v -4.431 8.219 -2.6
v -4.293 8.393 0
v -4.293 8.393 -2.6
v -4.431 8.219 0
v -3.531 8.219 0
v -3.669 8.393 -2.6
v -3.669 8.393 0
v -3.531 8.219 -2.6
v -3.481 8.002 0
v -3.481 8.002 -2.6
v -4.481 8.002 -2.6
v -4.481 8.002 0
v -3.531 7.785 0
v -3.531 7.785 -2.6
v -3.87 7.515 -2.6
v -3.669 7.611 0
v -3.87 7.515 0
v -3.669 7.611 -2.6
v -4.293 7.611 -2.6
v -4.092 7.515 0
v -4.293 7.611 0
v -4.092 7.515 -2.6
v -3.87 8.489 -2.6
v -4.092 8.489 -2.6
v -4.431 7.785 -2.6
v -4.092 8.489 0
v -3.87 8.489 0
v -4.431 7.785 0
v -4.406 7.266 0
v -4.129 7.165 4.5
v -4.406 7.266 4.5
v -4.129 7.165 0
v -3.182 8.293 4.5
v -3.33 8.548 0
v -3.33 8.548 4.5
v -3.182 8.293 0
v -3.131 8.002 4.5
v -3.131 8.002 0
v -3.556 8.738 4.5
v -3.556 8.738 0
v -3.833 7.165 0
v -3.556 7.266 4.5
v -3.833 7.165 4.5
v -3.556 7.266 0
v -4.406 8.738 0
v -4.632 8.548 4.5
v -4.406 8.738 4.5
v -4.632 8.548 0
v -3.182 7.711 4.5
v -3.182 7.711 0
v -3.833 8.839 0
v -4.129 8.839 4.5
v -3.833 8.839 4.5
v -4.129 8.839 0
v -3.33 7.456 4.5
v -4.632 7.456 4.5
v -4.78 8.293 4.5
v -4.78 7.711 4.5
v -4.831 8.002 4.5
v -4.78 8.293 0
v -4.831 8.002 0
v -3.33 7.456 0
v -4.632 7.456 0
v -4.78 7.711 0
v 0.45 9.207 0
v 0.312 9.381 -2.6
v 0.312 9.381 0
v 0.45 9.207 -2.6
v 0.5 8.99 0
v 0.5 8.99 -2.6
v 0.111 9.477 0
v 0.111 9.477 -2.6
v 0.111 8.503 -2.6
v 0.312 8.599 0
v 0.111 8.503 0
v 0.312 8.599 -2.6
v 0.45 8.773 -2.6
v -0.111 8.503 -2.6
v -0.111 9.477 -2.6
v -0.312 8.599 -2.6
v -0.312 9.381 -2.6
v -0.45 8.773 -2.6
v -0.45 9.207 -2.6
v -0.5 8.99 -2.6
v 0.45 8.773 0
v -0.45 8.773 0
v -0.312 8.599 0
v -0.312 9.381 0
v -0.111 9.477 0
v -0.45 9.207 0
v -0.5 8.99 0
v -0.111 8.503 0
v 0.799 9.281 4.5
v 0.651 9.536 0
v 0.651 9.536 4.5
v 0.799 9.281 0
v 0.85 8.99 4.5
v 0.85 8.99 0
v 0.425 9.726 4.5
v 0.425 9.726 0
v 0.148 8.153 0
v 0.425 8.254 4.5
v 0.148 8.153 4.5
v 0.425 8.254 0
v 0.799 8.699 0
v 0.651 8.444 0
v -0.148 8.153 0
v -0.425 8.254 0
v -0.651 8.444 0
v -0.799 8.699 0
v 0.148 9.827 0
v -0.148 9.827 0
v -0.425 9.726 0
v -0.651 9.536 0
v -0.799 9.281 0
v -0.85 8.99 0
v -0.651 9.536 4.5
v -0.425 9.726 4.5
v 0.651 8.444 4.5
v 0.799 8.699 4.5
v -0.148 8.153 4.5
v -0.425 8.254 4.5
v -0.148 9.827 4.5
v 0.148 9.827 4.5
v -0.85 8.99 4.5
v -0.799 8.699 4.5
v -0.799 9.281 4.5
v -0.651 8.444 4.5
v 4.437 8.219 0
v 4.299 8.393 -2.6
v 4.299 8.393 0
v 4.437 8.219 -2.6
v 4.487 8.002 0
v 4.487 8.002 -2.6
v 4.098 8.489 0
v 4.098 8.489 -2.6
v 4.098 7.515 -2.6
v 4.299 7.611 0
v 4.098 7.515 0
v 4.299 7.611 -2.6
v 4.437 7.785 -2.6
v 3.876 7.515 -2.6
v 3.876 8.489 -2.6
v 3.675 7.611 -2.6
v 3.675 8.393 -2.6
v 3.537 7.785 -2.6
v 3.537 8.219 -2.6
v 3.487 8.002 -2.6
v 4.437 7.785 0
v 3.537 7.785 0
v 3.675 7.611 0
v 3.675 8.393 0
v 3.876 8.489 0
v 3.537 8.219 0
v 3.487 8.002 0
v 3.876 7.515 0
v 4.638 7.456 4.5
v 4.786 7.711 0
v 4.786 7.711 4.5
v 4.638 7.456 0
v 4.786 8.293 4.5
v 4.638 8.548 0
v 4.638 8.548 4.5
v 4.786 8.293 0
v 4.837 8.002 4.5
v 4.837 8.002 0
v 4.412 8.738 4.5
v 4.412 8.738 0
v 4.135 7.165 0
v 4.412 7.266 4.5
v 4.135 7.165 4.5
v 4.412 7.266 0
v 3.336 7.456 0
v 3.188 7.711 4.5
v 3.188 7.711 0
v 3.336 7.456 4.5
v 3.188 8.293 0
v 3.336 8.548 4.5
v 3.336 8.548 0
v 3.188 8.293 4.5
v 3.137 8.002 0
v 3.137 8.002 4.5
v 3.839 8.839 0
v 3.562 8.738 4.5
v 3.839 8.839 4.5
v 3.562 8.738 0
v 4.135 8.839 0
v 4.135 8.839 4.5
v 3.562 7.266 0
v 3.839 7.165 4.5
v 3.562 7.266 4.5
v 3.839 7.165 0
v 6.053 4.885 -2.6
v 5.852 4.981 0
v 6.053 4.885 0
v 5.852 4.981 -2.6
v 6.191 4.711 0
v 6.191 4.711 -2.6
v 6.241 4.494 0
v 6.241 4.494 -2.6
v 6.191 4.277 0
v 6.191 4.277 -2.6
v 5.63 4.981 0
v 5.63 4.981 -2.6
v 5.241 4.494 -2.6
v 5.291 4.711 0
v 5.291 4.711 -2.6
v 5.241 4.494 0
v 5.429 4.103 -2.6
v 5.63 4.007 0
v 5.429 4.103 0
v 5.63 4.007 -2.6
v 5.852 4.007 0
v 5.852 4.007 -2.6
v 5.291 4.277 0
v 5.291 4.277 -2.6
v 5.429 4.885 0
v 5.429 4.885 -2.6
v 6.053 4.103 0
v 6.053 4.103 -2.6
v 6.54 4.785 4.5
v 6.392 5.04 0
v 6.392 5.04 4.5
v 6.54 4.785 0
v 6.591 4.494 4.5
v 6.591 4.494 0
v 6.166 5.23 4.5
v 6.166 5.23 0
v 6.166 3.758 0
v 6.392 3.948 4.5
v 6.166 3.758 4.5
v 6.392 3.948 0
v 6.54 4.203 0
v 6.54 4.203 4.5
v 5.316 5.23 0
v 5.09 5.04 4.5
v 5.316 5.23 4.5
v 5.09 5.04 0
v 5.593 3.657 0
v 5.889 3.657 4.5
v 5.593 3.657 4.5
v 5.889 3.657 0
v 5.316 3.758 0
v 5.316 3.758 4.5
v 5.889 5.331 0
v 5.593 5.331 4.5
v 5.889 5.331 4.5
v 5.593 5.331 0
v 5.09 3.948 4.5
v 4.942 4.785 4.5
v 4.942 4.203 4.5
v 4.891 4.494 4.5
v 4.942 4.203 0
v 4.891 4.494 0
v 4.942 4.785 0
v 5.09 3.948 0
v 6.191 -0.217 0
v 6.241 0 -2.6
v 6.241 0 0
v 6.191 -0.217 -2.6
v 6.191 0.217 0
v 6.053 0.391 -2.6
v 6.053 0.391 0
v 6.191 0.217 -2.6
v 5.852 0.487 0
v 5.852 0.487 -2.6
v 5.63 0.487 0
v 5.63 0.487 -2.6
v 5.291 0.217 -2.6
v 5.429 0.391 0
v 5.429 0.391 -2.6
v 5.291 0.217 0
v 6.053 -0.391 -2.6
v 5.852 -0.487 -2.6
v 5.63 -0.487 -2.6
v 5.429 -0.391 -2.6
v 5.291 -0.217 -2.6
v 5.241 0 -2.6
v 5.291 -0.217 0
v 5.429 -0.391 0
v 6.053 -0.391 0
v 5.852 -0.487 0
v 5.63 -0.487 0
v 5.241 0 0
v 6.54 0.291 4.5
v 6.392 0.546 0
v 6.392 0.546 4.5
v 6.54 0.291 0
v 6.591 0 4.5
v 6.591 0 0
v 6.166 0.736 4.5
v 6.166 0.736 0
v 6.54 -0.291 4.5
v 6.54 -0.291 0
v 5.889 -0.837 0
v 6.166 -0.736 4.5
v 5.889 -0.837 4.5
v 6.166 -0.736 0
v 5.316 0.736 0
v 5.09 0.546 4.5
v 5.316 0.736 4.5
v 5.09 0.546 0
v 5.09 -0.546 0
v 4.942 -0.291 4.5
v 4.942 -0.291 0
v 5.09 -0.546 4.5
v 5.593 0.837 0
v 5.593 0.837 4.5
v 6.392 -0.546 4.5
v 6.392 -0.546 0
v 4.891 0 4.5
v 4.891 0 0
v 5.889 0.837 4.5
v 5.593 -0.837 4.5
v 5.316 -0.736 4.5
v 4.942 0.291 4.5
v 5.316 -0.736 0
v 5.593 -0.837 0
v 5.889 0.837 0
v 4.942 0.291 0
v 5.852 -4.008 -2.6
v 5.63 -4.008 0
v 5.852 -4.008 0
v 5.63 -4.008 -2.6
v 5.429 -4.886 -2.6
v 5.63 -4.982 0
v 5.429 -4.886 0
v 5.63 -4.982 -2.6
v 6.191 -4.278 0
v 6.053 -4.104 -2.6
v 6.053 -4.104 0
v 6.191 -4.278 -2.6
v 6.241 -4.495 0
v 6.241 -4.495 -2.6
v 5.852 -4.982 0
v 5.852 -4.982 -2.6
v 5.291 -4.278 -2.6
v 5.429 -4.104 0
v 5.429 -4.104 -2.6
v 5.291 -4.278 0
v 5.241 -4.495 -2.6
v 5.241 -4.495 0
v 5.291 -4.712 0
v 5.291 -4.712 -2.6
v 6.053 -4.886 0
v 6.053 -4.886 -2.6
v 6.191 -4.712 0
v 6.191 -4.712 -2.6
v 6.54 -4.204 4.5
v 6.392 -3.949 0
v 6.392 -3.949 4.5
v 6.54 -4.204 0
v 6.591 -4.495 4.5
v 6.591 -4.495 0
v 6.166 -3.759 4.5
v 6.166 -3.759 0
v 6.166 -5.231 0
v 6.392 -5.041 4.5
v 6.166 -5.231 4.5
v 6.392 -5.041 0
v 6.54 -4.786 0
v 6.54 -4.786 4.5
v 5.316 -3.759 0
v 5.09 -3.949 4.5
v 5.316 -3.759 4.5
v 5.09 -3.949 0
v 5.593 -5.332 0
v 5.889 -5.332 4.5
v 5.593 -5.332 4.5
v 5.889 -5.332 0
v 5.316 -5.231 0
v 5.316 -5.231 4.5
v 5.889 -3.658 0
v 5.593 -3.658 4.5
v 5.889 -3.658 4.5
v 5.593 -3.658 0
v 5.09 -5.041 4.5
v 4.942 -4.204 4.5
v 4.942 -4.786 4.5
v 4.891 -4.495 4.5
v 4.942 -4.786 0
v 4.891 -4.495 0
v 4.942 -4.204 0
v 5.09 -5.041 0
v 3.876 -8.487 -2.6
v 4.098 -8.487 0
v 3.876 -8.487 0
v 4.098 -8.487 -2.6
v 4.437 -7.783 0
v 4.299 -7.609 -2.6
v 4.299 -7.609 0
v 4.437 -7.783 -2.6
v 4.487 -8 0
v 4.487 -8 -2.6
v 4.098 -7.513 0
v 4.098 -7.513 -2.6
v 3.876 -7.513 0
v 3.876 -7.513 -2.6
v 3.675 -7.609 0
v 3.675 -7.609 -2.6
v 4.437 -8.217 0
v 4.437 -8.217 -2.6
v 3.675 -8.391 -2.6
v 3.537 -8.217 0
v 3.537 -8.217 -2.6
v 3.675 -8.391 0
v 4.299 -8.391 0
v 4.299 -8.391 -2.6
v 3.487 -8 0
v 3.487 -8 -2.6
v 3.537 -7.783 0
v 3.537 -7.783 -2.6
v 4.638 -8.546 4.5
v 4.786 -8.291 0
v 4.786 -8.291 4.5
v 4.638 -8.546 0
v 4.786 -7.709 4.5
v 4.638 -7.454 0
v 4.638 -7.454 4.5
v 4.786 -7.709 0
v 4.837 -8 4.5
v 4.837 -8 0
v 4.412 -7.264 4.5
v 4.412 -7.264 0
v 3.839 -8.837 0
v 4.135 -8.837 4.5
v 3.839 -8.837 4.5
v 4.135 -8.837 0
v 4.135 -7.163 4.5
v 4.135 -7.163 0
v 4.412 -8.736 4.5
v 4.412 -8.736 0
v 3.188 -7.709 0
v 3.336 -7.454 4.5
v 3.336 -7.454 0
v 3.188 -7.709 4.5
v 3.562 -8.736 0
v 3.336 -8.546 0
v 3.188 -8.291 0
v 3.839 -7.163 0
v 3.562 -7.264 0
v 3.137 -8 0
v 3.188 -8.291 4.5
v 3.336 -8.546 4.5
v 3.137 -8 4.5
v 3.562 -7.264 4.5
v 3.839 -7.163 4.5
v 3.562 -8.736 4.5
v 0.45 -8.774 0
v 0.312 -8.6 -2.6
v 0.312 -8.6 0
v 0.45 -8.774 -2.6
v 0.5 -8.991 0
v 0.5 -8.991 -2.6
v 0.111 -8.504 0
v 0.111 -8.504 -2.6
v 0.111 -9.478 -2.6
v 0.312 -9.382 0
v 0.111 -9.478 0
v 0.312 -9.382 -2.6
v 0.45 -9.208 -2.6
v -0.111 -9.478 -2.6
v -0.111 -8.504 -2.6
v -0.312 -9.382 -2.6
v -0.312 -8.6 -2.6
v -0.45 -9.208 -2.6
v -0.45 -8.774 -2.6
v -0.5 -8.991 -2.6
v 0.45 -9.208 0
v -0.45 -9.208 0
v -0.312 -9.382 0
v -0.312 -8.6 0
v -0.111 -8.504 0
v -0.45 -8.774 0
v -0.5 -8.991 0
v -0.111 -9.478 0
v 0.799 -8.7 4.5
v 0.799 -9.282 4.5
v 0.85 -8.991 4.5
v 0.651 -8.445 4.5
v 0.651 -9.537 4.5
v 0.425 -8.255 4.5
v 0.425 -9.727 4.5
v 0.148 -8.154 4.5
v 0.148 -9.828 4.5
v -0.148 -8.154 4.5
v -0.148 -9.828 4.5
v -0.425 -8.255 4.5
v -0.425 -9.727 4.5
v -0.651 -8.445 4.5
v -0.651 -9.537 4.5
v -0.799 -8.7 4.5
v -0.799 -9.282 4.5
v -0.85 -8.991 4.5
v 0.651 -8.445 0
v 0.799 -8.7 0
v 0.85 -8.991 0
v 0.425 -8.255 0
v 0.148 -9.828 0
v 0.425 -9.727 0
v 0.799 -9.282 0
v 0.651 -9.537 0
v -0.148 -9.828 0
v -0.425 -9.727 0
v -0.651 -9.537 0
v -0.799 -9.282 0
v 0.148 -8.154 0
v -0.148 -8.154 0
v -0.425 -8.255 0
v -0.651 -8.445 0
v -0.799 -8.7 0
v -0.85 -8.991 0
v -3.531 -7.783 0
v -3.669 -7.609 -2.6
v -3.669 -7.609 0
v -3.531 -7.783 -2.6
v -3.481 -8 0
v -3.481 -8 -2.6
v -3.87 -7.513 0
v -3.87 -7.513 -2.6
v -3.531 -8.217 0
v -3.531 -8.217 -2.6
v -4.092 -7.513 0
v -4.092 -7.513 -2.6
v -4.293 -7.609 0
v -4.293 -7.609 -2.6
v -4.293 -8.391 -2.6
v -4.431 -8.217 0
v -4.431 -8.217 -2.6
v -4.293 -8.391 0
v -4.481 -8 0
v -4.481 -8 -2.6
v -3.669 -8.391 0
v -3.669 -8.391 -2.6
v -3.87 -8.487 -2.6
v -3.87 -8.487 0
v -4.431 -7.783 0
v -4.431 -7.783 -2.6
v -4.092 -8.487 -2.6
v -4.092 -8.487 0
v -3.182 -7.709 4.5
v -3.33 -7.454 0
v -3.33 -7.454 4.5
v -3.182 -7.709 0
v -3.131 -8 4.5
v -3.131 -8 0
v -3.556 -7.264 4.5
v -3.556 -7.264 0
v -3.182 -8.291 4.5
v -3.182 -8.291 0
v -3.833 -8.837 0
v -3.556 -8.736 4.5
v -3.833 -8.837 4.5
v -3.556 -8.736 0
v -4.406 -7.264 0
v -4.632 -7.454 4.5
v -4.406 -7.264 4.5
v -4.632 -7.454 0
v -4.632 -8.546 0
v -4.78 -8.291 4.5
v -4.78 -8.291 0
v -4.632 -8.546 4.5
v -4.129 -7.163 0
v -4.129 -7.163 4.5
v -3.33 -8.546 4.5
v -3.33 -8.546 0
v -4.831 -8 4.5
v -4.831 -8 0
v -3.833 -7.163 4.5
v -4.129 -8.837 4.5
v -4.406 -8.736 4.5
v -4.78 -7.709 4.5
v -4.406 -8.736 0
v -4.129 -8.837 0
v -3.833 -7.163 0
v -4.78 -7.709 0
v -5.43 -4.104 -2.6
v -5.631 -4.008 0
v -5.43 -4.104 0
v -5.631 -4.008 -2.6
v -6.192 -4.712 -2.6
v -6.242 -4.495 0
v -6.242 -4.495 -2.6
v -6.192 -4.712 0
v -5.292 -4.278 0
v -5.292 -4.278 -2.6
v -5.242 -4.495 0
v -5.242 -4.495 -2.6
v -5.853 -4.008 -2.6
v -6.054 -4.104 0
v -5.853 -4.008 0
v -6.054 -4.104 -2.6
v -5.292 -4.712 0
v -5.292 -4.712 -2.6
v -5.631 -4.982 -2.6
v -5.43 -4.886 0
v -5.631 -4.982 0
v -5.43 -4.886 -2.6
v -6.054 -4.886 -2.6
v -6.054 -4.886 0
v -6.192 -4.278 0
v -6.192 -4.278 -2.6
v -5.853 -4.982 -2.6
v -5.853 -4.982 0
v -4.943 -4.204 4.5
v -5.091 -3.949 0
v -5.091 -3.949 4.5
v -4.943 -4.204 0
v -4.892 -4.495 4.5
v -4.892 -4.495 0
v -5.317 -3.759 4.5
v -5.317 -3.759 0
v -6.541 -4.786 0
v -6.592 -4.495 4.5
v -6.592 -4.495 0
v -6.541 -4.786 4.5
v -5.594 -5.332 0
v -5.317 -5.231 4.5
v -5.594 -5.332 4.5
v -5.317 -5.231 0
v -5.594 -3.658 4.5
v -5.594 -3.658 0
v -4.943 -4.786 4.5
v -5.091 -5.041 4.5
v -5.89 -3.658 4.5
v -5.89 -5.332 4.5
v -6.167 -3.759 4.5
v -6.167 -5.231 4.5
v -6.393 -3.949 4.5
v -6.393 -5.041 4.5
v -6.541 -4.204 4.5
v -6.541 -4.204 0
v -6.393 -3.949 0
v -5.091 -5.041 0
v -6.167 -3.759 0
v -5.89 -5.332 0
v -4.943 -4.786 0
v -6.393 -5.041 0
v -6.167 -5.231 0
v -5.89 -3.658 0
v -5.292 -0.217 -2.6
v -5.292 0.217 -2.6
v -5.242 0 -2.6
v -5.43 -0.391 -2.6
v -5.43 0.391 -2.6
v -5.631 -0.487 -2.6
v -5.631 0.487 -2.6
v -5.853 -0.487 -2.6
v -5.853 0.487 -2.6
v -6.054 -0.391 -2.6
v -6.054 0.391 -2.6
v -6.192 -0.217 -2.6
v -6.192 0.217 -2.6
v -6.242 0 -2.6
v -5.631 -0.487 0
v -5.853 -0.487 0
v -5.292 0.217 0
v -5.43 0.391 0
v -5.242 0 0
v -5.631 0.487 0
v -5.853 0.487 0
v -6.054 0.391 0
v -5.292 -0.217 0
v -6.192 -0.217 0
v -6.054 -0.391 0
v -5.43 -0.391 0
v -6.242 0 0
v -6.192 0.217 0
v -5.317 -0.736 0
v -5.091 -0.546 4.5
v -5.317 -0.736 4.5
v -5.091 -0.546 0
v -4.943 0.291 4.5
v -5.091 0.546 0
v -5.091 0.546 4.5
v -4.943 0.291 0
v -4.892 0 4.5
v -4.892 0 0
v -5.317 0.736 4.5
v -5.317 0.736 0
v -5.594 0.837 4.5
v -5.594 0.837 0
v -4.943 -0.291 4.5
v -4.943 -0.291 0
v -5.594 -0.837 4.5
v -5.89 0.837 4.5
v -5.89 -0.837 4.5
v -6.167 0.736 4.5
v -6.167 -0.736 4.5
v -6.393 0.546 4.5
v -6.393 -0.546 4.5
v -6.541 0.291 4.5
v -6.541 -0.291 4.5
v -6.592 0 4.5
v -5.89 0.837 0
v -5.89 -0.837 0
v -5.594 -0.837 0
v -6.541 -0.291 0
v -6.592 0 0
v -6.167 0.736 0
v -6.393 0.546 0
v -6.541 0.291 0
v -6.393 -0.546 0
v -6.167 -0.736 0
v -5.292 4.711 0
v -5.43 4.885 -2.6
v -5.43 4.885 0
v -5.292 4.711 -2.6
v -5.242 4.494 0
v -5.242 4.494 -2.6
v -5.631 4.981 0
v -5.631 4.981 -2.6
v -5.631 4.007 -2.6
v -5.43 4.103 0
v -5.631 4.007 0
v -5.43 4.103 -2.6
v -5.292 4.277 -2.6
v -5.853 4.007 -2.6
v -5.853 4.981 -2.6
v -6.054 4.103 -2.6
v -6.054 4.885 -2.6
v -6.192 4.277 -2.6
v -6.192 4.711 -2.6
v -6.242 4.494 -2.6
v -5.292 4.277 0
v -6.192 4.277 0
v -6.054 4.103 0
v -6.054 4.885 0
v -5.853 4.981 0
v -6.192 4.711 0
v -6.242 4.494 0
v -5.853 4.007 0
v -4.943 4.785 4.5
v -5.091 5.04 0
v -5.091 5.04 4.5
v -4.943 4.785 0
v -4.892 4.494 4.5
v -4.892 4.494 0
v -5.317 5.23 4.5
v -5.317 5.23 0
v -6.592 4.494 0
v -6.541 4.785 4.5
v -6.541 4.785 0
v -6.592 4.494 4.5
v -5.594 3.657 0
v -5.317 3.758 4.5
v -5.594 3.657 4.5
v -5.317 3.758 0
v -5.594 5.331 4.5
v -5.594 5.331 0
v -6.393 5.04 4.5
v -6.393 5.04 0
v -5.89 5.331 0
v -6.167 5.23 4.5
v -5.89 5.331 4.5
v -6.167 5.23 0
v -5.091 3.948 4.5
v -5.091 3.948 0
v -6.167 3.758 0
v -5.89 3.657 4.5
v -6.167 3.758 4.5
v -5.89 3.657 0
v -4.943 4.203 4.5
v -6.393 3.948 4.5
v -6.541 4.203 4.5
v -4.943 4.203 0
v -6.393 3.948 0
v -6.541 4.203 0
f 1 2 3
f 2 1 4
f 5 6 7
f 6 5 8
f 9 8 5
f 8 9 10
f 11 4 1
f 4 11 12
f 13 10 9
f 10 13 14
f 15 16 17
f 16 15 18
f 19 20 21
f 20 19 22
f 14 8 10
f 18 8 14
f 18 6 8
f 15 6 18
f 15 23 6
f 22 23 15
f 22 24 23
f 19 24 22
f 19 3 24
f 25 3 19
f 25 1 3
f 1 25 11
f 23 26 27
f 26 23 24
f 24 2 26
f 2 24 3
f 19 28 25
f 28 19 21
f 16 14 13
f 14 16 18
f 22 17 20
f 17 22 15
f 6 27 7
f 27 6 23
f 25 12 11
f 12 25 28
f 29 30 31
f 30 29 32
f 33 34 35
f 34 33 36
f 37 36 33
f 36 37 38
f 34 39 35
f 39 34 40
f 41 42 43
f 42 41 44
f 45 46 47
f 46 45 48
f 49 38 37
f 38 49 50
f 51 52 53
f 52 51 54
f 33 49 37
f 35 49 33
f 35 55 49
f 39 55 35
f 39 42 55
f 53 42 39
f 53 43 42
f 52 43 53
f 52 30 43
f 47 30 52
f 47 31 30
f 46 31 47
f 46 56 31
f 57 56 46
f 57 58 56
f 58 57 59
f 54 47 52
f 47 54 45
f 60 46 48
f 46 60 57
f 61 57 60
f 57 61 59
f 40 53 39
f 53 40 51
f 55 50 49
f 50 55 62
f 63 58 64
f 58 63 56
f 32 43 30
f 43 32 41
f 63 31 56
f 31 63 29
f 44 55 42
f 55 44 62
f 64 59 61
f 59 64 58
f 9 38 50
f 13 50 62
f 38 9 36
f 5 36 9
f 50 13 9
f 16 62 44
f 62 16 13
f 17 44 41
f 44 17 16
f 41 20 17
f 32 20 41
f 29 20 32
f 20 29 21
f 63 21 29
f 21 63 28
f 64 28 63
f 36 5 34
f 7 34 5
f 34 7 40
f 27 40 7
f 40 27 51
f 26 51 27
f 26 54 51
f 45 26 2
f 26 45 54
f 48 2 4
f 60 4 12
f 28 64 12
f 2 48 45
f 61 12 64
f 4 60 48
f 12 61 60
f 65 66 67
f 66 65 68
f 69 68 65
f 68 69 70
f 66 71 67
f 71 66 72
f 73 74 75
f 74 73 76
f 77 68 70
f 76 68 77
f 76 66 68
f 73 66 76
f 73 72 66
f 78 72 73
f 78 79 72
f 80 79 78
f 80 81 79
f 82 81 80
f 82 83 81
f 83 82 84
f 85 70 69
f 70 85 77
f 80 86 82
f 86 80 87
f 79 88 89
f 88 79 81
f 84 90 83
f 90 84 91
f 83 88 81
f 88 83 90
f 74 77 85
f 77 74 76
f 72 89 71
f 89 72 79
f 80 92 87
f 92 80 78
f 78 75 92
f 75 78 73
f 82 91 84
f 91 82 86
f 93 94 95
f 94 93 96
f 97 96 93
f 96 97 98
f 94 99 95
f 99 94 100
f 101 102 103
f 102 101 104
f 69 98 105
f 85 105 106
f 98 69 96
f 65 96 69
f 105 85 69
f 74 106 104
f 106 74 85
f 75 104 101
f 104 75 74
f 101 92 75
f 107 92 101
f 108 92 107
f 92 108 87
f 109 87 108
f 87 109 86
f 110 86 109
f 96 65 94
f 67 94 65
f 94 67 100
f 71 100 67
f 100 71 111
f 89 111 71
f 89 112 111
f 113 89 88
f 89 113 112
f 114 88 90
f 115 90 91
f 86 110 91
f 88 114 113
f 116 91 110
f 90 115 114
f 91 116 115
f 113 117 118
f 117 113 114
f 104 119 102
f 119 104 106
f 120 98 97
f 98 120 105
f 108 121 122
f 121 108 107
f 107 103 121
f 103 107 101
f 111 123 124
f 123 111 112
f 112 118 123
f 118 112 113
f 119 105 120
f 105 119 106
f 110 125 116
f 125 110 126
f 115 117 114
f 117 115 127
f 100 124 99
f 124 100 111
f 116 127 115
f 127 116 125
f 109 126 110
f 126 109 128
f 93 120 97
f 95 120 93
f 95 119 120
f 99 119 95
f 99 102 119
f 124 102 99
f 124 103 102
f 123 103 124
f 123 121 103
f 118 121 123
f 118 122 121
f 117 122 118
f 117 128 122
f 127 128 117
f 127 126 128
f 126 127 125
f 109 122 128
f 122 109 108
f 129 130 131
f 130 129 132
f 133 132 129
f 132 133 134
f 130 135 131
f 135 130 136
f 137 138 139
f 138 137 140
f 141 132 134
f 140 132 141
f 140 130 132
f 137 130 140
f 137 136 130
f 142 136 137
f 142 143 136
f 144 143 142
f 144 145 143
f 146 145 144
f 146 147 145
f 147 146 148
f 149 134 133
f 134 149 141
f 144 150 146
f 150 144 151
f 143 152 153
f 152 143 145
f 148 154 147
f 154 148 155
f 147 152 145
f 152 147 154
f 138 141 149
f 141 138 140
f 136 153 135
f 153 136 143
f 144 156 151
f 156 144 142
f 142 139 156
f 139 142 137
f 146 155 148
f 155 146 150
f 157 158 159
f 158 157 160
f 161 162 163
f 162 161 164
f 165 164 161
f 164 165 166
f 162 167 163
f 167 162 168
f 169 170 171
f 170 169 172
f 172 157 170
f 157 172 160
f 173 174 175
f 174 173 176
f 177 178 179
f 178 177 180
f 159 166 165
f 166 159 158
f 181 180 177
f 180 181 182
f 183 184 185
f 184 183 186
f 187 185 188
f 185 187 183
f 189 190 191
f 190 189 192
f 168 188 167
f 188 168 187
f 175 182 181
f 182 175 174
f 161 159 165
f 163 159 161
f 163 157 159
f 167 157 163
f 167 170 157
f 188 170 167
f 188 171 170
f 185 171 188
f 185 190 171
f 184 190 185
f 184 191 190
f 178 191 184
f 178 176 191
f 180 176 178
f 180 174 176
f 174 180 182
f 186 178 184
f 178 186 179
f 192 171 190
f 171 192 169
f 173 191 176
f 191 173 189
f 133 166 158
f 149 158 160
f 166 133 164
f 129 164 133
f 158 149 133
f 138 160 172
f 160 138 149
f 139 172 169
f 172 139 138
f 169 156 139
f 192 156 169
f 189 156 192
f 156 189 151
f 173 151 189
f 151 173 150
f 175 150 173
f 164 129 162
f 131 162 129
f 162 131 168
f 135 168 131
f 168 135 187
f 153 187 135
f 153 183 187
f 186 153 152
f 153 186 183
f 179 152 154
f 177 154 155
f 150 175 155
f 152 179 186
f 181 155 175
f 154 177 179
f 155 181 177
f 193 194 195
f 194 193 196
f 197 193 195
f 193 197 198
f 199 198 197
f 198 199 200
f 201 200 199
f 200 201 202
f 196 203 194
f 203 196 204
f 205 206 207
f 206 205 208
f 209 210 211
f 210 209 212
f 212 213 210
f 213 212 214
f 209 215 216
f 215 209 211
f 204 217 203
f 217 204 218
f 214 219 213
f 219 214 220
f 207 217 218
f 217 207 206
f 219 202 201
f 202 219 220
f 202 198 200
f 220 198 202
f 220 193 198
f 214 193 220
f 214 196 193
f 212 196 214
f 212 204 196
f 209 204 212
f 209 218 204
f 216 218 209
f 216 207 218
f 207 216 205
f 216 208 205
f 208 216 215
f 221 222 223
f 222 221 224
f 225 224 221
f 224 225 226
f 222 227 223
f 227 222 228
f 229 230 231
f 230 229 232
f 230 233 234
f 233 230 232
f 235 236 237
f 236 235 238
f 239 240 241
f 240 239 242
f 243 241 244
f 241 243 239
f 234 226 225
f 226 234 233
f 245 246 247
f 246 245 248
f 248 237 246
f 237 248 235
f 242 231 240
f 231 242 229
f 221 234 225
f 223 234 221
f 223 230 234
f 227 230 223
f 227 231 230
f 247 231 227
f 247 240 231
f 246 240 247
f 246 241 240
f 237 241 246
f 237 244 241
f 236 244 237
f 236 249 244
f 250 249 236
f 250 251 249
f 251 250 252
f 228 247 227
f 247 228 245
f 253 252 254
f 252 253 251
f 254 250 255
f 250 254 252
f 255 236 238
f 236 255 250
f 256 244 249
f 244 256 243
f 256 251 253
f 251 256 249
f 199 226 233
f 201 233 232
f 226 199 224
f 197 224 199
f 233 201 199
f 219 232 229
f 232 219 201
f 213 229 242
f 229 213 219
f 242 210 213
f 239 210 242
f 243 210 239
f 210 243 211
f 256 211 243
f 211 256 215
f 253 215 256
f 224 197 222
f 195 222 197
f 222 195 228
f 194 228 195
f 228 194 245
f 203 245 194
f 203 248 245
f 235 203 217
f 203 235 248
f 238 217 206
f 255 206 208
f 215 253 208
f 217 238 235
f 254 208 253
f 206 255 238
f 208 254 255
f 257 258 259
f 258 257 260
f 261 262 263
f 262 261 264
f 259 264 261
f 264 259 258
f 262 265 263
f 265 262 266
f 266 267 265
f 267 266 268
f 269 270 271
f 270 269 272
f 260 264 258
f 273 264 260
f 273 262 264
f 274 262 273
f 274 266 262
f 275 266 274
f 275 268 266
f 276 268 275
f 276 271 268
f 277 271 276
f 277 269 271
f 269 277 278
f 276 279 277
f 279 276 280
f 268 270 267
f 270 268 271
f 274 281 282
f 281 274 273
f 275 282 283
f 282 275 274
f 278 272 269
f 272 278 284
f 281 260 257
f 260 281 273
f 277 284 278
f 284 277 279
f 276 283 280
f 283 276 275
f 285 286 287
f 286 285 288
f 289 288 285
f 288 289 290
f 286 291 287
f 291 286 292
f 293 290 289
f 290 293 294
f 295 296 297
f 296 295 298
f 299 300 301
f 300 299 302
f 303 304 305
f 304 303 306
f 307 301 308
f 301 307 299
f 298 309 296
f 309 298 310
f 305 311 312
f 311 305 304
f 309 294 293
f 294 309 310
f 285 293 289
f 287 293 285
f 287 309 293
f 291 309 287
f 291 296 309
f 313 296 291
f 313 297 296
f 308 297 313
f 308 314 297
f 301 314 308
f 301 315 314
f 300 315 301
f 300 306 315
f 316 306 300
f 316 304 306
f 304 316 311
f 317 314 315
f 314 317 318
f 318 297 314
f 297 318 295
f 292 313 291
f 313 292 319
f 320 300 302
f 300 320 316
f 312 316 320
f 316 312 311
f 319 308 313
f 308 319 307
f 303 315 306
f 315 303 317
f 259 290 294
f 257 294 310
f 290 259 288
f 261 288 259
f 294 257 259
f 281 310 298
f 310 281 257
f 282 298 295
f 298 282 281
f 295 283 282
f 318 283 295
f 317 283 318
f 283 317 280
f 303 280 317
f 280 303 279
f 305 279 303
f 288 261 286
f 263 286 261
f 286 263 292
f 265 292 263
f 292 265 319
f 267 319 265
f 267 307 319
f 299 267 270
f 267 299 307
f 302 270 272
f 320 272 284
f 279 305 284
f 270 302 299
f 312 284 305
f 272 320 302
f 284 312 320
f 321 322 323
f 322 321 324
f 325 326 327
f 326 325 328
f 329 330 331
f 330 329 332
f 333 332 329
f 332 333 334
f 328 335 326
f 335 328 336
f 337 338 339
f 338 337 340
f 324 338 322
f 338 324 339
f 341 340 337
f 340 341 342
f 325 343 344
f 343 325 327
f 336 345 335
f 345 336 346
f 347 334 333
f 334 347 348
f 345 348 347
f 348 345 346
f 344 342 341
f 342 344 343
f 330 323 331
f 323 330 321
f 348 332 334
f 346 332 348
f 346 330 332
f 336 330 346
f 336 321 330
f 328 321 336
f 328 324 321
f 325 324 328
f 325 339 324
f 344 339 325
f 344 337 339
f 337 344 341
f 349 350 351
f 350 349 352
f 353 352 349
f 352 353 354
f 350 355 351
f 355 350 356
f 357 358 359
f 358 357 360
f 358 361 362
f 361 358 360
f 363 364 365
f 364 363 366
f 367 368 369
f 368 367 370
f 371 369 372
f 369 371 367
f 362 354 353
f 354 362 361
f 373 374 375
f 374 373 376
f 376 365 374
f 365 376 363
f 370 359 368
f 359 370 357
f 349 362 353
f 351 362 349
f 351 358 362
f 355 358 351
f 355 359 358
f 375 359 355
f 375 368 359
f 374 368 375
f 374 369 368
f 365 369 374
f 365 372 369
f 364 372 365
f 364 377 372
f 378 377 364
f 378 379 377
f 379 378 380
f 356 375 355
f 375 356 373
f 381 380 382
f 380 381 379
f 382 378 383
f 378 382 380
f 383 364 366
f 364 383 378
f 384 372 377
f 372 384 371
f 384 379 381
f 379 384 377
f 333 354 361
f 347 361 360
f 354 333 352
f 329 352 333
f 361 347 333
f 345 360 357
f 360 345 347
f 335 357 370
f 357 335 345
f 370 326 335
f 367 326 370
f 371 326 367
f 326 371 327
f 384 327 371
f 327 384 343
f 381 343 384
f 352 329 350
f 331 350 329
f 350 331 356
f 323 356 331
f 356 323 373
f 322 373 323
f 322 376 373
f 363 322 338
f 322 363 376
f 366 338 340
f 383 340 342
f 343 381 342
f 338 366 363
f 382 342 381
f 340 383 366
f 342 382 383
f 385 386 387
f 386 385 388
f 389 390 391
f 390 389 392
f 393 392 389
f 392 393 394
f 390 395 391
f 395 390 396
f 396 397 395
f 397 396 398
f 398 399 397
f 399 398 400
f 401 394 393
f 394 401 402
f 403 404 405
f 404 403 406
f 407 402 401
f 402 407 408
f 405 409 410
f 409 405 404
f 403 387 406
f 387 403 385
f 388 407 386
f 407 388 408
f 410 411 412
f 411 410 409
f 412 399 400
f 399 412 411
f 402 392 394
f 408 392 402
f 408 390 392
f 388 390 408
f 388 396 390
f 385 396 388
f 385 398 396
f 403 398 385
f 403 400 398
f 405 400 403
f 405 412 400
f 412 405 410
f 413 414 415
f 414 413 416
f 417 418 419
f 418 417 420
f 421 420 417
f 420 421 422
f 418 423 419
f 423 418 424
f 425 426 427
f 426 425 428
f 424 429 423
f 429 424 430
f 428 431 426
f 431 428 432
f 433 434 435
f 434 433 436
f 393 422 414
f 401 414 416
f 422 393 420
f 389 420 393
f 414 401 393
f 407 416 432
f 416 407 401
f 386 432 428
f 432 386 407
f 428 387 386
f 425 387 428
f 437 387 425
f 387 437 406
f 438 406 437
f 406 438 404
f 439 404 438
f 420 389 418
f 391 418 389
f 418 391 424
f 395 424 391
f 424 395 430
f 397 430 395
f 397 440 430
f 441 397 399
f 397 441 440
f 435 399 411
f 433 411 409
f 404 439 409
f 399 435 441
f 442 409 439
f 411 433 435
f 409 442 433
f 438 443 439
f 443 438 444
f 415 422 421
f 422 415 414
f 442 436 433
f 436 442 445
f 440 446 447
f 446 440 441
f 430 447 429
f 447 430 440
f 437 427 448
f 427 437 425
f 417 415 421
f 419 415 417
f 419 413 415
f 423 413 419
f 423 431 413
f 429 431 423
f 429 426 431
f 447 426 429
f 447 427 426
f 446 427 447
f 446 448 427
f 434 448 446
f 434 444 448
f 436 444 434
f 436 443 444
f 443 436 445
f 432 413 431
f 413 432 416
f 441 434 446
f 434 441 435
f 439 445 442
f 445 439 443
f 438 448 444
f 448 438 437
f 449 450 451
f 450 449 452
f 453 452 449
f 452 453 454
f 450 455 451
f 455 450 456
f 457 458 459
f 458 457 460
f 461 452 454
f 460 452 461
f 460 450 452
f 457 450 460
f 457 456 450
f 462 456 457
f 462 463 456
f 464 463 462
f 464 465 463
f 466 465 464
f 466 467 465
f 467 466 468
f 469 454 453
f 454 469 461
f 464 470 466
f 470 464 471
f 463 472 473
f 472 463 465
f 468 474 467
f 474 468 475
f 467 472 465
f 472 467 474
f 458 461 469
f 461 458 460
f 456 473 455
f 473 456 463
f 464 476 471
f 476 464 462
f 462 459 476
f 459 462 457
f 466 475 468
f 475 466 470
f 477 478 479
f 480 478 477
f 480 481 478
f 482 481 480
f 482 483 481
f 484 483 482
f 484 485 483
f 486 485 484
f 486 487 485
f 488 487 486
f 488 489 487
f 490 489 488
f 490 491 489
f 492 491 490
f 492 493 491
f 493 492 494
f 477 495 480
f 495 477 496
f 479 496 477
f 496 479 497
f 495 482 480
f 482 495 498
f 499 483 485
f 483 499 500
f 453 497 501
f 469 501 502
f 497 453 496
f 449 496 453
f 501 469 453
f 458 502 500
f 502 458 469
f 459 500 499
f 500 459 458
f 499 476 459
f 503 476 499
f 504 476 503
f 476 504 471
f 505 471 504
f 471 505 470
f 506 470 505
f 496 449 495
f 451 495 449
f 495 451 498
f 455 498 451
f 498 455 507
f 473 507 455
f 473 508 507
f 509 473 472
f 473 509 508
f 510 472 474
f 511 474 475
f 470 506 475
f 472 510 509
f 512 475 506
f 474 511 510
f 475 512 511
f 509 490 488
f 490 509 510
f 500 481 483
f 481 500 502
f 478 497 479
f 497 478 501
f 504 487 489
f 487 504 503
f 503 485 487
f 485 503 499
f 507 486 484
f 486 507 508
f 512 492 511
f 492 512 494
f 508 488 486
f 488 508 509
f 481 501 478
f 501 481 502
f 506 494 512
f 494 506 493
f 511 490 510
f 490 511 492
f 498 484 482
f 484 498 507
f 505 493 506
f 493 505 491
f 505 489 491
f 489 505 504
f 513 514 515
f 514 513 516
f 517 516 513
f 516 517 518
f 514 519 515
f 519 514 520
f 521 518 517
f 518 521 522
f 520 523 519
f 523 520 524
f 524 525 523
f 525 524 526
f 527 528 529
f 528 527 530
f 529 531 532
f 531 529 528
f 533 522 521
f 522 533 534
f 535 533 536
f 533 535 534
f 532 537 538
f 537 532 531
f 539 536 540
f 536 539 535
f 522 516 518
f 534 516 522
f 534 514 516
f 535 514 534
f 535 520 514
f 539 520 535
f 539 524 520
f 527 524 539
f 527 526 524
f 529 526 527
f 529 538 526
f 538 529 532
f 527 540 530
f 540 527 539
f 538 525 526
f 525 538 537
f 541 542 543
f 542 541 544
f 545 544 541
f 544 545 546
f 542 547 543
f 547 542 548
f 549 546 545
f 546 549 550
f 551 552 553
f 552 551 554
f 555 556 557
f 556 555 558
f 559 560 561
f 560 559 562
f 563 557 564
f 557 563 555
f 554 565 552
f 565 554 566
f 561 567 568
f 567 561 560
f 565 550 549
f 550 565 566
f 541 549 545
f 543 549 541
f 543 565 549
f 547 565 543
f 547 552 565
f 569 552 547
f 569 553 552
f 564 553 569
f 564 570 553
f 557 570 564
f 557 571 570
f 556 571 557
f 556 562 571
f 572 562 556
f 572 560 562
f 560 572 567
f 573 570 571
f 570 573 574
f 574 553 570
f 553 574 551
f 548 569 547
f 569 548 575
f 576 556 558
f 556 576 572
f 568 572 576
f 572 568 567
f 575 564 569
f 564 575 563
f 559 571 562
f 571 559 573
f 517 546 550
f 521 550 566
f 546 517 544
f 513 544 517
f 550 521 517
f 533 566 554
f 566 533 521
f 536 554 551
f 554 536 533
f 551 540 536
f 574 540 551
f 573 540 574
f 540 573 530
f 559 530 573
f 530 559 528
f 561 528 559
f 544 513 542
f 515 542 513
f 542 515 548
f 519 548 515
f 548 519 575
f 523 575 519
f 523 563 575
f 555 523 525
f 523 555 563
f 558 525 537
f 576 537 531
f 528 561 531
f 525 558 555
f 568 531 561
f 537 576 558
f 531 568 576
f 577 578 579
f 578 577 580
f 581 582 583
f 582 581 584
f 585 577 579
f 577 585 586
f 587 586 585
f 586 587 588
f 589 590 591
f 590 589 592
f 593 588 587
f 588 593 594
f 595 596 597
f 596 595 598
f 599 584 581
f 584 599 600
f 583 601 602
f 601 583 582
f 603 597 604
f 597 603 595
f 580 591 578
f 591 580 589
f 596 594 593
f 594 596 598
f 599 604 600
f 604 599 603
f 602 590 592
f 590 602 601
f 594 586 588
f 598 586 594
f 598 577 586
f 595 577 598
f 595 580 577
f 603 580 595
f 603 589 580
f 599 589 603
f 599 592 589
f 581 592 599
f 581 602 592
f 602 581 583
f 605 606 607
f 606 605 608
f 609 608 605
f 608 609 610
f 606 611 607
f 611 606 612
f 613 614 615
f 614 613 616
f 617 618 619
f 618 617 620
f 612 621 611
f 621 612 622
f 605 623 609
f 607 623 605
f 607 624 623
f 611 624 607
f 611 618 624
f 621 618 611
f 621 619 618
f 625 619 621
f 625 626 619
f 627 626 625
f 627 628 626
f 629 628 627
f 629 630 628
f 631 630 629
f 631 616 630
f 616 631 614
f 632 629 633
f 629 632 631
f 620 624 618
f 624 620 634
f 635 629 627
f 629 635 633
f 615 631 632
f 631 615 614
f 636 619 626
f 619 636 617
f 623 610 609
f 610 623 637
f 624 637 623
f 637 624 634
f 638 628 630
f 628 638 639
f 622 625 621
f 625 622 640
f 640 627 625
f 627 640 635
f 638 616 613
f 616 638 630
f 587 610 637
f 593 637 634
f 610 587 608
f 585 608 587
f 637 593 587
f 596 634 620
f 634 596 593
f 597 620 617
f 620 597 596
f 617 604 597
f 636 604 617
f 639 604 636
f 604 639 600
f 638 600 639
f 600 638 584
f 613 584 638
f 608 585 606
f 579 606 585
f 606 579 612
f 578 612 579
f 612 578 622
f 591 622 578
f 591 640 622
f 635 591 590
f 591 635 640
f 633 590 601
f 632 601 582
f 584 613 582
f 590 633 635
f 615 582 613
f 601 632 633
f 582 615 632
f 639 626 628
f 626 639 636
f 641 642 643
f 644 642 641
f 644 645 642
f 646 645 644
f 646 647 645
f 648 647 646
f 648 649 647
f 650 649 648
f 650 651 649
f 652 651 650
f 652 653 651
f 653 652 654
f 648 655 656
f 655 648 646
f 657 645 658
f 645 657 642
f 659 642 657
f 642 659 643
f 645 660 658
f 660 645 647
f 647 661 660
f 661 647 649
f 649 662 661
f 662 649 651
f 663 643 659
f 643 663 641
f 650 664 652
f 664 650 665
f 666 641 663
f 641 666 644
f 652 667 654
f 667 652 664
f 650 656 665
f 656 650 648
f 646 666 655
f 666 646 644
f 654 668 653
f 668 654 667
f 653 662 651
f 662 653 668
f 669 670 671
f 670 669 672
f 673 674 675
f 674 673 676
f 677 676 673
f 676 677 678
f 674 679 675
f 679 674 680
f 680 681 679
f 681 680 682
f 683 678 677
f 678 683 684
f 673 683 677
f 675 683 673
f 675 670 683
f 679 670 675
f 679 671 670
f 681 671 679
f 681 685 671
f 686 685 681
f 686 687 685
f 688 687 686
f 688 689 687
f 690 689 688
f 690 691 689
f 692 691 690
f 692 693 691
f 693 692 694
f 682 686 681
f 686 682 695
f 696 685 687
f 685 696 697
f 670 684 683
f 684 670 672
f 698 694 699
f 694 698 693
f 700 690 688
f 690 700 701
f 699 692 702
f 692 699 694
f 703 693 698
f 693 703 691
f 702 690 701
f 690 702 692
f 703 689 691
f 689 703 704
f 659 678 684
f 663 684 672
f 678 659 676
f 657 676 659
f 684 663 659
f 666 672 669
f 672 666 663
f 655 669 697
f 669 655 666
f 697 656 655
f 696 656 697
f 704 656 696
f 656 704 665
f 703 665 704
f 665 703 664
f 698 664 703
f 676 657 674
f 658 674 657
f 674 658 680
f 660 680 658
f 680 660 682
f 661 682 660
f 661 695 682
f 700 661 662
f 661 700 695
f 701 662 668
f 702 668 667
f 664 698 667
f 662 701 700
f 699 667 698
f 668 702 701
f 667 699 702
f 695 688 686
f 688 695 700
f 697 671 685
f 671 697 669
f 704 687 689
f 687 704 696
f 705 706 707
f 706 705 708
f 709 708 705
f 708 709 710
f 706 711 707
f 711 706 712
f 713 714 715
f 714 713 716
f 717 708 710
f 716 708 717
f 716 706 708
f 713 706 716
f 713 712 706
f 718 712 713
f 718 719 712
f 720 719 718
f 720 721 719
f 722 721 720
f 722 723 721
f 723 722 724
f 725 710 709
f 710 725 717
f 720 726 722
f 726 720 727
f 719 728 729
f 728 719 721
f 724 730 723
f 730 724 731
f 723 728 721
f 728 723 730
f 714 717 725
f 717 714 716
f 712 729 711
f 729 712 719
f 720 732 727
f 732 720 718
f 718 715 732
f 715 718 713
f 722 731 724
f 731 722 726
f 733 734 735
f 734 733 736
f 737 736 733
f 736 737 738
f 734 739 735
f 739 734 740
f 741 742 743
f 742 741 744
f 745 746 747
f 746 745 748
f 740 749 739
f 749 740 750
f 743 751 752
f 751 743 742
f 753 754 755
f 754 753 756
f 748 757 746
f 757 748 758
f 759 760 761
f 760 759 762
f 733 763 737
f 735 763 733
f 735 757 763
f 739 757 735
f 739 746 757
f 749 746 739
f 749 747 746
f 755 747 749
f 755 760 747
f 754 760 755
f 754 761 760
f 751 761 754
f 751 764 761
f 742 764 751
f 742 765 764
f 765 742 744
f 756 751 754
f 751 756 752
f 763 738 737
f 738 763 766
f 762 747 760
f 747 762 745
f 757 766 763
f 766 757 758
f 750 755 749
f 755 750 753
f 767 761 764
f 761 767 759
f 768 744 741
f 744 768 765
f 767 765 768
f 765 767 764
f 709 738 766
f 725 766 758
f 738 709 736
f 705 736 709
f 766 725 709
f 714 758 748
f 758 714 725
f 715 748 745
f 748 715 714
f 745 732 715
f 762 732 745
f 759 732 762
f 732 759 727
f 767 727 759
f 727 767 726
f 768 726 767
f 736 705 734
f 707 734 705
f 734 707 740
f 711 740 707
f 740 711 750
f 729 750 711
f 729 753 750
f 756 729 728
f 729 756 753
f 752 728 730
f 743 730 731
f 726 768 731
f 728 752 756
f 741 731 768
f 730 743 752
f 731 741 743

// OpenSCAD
// What the nixie tubes of TS06-DISP stand on. Made for 3d/populated.
//
// layers: sleeve=#d1ad45 wire=#c9cdd1 pip=#e3e7ea
// variants: in12_contacts MODE=0 ; in17_wires MODE=1 ; in17_pip MODE=2
//
// FRAME  KiCad model frame (a footprint's y negated), origin = the footprint origin, z up from the board face.
//
// in12_contacts (V1-V4, V9, V10)   twelve tube-socket contacts on the TS06_IN12_Socket pad ring, one per pad.
//   pad positions    MEASURED (repo source): PCB/lib/TS06.pretty/TS06_IN12_Socket.kicad_mod, pads 1-12
//   sleeve height    4.5 mm      INFERRED: case_pair.py IN12_SEAT 4.5 (assumed there: "TS06-LIB-SOCKET is not captured"). The
//                                tube model (3d/IN12.step) is placed with its glass 4.5 mm above the board face to match.
//   sleeve D1.7, bore not drawn, tail D1.0 to 1.0 mm past the back face   INFERRED; PCB/TS06-DISP/bom.md only says
//                                "tube socket contact, 12 per tube, tail to suit the 1.2 mm hole"
//
// in17_wires (V5, V6)    the wire leads of the IN-17 between the end of the model's own stubs and the board.
//   pad positions    MEASURED (repo source): TS06_IN17_Socket.kicad_mod, the 11 pads (the 12th lead is absent)
//   why             3d/IN17.step carries only 5.5 mm of lead, and tools/models3d.json scales the whole model along the tube's
//                   axis by 19.72 / 24.3 (the owner's bench caliper, 2026-10-02: the glass is 19.72 from the dome to the end of
//                   the glass), so its stubs are 4.46 mm long. With the glass end STANDOFF = 10.28 mm off the board (case_pair.py
//                   IN17_STANDOFF = Z_DISP_F - IN17_D, so the faces are coplanar with the IN-12s) the stubs end 5.82 mm above
//                   the board, so wires D0.4 are drawn from there down to 0.8 mm past the back face.  INFERRED
//                   (wire D0.4; the stubs in IN17.step measure 0.3 across).  See README.md, open item "IN-17 leads".
//
// in17_pip (V5, V6)      the exhaust pip of the IN-17, standing out of the glass end between the leads.
//   length          4.0 mm      THE OWNER'S ESTIMATE, 2026-10-02 (case_pair.py IN17_PIP, kind estimate): "closer to 4 mm". Not a caliper
//                               reading. The outline drawing's 22 mm is therefore not the glass (19.72, measured) plus the pip.
//   diameter 3.5, round tip     INFERRED (the lead pattern is 5.6 mm across, so a pip under 5 mm stands between the rows).
//   place           centred on the lead pattern; the tip 4.0 mm below the glass end, 6.28 mm above the board face.
STANDOFF = 10.28;     // the glass end above the board face: case_pair.py IN17_STANDOFF
PIP = 4.0;            // case_pair.py IN17_PIP
STUB_END = STANDOFF - 5.5 * 19.72 / 24.3;      // where the model's scaled stubs end above the board: 5.82
MODE = 0;
L = "sleeve";

IN12 = [[-3.981, -8.002], [0.000, -8.990], [3.987, -8.002], [5.741, -4.494], [5.741, 0.000], [5.741, 4.495],
        [3.987, 8.000], [0.000, 8.991], [-3.981, 8.000], [-5.742, 4.495], [-5.742, 0.000], [-5.742, -4.494]];
IN17 = [[2.7774, -1.5], [2.7774, -4.0], [1.3649, -6.0], [-1.3651, -6.0], [-2.7776, -4.0], [-2.8576, -1.5],
        [-2.8176, 1.1425], [-2.7776, 3.6825], [-1.3651, 5.6825], [1.3649, 5.6825], [2.7774, 3.6825]];

if (MODE == 0 && L == "sleeve") for (p = IN12) {
    translate([p[0], -p[1], -2.6]) cylinder(d = 1.0, h = 2.6 + 0.2, $fn = 14);
    translate([p[0], -p[1], 0]) cylinder(d = 1.7, h = 4.5, $fn = 18);
}
if (MODE == 1 && L == "wire") for (p = IN17) translate([p[0], -p[1], -2.4])
    cylinder(d = 0.4, h = 2.4 + STUB_END + 0.1, $fn = 10);
if (MODE == 2 && L == "pip") translate([-0.04, 0.16, 0]) hull() {
    translate([0, 0, STANDOFF - PIP + 1.75]) sphere(d = 3.5, $fn = 24);
    translate([0, 0, STANDOFF + 0.09]) cylinder(d = 3.5, h = 0.01, $fn = 24);
}
